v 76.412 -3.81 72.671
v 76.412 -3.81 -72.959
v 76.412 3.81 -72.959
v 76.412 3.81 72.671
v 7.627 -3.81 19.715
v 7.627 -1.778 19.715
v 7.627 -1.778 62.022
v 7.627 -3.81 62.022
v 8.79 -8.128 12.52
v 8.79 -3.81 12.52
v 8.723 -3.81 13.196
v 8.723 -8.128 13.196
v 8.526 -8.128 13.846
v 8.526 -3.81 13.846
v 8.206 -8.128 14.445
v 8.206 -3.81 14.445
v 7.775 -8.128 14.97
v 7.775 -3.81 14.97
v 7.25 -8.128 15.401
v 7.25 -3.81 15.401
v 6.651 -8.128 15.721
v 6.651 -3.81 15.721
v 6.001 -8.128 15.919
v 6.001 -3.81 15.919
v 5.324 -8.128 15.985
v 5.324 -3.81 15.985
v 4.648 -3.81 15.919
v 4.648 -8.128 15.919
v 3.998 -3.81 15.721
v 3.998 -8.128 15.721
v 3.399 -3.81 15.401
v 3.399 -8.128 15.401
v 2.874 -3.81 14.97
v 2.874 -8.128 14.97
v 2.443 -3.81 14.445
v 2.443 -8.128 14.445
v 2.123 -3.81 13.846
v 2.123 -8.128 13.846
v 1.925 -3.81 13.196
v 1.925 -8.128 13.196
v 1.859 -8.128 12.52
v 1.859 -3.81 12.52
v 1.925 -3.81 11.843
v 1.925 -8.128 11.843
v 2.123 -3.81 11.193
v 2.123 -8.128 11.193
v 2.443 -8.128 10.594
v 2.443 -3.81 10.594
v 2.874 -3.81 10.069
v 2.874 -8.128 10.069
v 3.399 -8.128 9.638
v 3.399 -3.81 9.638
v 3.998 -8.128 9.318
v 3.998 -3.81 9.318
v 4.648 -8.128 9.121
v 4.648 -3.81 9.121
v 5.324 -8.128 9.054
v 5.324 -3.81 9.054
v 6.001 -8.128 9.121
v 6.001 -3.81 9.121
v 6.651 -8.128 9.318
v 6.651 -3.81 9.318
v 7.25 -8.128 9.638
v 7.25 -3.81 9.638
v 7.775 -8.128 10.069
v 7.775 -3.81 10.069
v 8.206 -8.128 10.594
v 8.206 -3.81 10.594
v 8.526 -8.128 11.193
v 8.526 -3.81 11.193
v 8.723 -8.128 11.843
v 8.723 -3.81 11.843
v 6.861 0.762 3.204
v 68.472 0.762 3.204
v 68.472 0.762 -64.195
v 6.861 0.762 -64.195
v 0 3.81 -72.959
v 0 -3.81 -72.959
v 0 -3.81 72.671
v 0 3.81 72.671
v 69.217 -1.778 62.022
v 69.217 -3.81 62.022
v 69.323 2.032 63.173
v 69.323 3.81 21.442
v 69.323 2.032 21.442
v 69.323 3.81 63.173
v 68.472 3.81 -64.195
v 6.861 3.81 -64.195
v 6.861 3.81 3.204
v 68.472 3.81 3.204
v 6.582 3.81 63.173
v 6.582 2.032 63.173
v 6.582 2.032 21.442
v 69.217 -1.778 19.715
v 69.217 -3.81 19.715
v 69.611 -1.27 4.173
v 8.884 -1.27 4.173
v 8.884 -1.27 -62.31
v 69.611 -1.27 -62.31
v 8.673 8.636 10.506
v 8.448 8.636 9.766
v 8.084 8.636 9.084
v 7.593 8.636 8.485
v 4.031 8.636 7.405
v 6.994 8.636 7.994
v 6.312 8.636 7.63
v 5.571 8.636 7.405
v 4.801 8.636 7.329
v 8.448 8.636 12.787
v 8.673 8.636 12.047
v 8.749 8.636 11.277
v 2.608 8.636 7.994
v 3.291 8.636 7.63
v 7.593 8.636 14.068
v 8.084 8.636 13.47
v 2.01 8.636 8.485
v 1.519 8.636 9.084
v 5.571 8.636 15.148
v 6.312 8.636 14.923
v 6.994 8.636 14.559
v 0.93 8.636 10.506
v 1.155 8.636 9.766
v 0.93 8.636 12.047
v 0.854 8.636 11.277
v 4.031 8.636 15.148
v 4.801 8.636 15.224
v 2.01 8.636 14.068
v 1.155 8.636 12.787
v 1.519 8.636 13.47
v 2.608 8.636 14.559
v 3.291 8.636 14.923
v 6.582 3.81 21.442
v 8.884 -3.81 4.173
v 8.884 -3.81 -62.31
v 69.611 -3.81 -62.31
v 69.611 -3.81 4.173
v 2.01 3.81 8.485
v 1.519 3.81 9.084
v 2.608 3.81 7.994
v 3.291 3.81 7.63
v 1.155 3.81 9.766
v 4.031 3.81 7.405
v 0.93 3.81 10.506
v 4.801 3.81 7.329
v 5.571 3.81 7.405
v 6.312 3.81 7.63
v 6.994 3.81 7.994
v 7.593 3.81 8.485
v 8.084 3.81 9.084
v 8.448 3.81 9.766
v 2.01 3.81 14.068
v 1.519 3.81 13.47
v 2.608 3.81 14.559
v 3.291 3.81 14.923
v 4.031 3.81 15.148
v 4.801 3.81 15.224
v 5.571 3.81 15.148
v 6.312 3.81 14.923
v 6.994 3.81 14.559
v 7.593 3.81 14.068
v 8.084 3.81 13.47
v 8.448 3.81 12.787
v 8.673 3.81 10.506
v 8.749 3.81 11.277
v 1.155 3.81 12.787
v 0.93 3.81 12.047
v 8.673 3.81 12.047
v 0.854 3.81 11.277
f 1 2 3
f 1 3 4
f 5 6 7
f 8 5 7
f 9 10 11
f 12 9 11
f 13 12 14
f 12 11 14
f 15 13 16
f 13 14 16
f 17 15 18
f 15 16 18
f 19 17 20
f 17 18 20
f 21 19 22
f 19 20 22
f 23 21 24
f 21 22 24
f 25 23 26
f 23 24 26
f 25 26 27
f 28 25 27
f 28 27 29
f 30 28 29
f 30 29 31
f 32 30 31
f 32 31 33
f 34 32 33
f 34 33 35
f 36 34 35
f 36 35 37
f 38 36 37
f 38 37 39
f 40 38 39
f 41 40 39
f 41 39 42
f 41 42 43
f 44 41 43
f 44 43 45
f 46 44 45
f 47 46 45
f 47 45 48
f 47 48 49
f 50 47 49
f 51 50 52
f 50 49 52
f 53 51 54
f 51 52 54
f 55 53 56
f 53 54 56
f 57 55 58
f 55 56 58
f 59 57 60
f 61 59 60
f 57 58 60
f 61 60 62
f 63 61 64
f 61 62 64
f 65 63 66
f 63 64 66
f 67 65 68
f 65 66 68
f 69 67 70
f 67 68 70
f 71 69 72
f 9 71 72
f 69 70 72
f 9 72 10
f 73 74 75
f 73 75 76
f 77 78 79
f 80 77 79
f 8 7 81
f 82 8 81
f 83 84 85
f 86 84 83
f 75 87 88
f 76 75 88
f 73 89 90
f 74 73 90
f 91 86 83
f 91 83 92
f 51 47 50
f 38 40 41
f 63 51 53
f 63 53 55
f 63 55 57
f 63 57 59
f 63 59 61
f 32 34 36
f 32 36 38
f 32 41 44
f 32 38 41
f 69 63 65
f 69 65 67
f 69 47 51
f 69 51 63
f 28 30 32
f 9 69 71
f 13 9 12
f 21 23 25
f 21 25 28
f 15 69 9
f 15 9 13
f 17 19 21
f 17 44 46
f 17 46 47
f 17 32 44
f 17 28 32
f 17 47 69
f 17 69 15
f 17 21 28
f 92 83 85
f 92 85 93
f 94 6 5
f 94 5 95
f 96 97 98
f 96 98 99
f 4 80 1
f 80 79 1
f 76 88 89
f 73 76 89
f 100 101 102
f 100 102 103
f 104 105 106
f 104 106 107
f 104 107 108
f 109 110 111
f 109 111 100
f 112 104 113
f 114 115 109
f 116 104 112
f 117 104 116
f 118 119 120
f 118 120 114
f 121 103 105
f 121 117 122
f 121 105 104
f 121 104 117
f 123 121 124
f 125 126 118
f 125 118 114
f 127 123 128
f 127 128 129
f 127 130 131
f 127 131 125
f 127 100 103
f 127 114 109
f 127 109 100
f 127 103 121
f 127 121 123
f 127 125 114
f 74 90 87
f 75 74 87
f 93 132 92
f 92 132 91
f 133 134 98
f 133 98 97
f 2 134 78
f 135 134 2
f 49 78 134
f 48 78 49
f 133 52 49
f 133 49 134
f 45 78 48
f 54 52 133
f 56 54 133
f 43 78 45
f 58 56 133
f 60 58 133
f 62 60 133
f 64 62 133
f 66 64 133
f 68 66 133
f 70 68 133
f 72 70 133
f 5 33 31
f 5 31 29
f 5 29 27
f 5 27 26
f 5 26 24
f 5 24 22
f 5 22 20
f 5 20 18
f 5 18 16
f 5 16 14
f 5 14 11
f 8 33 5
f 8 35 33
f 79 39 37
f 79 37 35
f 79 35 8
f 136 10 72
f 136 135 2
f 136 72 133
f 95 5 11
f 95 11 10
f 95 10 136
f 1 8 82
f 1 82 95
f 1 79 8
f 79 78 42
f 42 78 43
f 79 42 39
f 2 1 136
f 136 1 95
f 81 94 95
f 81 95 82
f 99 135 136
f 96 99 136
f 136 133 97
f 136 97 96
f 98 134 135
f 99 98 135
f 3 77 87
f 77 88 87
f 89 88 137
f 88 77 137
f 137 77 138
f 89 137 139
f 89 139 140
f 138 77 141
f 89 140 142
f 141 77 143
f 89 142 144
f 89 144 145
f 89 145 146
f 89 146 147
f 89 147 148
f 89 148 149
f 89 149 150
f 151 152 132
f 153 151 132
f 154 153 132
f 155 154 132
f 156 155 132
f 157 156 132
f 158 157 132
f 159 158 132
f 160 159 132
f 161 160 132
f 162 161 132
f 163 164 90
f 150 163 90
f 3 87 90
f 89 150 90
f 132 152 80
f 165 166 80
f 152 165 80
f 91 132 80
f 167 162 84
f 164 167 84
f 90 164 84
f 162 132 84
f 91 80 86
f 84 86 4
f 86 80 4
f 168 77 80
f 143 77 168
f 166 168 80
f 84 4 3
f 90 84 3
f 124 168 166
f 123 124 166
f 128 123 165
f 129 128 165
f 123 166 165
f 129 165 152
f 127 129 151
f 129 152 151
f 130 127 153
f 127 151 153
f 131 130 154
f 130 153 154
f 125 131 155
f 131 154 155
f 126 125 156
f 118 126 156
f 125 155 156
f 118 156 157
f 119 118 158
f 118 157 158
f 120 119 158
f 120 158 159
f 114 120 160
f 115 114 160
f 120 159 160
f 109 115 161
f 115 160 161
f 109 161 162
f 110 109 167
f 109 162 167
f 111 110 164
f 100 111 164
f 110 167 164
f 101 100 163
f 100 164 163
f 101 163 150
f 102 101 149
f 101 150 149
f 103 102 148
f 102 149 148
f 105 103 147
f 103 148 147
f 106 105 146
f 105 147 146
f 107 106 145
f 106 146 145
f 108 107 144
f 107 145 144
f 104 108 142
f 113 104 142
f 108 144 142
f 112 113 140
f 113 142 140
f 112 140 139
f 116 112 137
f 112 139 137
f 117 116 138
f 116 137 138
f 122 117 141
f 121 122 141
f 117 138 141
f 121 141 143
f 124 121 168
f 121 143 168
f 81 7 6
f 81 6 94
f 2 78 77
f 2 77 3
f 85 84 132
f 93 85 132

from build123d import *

# Parameters (mm, degrees)
F2_R      = 3.46564
F3_DEPTH  = 8.128
F1_W      = 76.412424
F1_H      = 145.629719
F1_W_2    = 61.590434
F1_H_2    = 42.307448
F4_DEPTH  = 3.81
F5_DEPTH  = 1.778
F6_W      = 60.727017
F6_H      = 66.483134
F7_DEPTH  = 2.54
F0_W      = 76.412424
F0_H      = 145.629719
F8_DEPTH  = 3.81
F10_W     = 62.741654
F10_H     = 41.73184
F11_DEPTH = 1.778
F13_DEPTH = 3.048
F14_R     = 3.947357
F15_DEPTH = 4.826


with BuildPart() as f3:
    # F2 (on face) → F3 (new body)
    with BuildSketch(Plane.XZ):
        with Locations((5.324407, 12.51955)):
            Circle(F2_R)
    extrude(amount=F3_DEPTH)

    # F1 (on face) → F4 (join)
    with BuildSketch(Plane.XZ):
        with Locations((38.206212, -0.143901)):
            Rectangle(F1_W, F1_H)
        with Locations((38.42207, 40.868418)):
            Rectangle(F1_W_2, F1_H_2, mode=Mode.SUBTRACT)
    extrude(amount=F4_DEPTH)

    # F1 (on face) → F5 (join)
    with BuildSketch(Plane.XZ):
        with Locations((38.42207, 40.868418)):
            Rectangle(F1_W_2, F1_H_2)
    extrude(amount=F5_DEPTH)

    # F6 (on face) → F7 (cut)
    with BuildSketch(Plane.XZ.offset(3.81)):
        with Locations((39.247795, -29.068384)):
            Rectangle(F6_W, F6_H)
    extrude(amount=-F7_DEPTH, mode=Mode.SUBTRACT)

    # F0 (on Front) → F8 (join)
    with BuildSketch(Plane.XZ):
        with Locations((38.206212, -0.143901)):
            Rectangle(F0_W, F0_H)
    extrude(amount=-F8_DEPTH)

    # F10 (on face) → F11 (cut)
    with BuildSketch(Plane(origin=(0, 3.81, 0), x_dir=(-1, 0, 0), z_dir=(0, 1, 0))):
        with Locations((-37.952668, 42.307449)):
            Rectangle(F10_W, F10_H)
    extrude(amount=-F11_DEPTH, mode=Mode.SUBTRACT)

    # F12 (on face) → F13 (cut)
    with BuildSketch(Plane(origin=(0, 3.81, 0), x_dir=(-1, 0, 0), z_dir=(0, 1, 0))):
        Polygon((-6.86057, 3.204095), (-68.471536, 3.204095), (-68.471536, -64.19491), (-6.86057, -64.19491), (-6.86057, -37.781585), align=None)
    extrude(amount=-F13_DEPTH, mode=Mode.SUBTRACT)

    # F14 (on face) → F15 (join)
    with BuildSketch(Plane(origin=(0, 3.81, 0), x_dir=(-1, 0, 0), z_dir=(0, 1, 0))):
        with Locations((-4.801393, 11.276569)):
            Circle(F14_R)
    extrude(amount=F15_DEPTH)


solid = f3.part
